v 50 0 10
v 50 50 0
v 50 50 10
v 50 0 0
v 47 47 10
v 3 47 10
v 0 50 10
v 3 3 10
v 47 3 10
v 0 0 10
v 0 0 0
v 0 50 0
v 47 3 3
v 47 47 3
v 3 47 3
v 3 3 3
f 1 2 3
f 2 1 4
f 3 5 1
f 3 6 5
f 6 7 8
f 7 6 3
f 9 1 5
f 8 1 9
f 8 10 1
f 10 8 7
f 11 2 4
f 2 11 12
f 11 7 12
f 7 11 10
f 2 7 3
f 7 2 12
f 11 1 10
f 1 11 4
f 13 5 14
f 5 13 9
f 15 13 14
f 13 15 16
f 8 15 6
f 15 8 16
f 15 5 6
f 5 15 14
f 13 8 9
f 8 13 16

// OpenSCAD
// Generated by HEIDI for job job_1787766301732_6ab06f02
// Product: 3D-Printable Model Preparation Package
// Request: Failure injection test
// Model type: box
// Generated: 2026-09-07T04:35:15.170Z
//
// This is a parameterized OpenSCAD model. You can adjust the
// parameters below to customize the dimensions before rendering.

// ─── Parameters ───
width = 50;       // X dimension in mm
height = 50;     // Y dimension in mm
depth = 10;       // Z dimension in mm
wall = 3;    // wall thickness in mm
$fn = 60;               // facet resolution

// Parametric hollow box
module parametric_box() {
    difference() {
        // Outer shell
        cube([width, height, depth]);
        // Inner cavity
        translate([wall, wall, wall])
            cube([width - wall * 2, height - wall * 2, depth - wall + 1]);
    }
}
parametric_box();
